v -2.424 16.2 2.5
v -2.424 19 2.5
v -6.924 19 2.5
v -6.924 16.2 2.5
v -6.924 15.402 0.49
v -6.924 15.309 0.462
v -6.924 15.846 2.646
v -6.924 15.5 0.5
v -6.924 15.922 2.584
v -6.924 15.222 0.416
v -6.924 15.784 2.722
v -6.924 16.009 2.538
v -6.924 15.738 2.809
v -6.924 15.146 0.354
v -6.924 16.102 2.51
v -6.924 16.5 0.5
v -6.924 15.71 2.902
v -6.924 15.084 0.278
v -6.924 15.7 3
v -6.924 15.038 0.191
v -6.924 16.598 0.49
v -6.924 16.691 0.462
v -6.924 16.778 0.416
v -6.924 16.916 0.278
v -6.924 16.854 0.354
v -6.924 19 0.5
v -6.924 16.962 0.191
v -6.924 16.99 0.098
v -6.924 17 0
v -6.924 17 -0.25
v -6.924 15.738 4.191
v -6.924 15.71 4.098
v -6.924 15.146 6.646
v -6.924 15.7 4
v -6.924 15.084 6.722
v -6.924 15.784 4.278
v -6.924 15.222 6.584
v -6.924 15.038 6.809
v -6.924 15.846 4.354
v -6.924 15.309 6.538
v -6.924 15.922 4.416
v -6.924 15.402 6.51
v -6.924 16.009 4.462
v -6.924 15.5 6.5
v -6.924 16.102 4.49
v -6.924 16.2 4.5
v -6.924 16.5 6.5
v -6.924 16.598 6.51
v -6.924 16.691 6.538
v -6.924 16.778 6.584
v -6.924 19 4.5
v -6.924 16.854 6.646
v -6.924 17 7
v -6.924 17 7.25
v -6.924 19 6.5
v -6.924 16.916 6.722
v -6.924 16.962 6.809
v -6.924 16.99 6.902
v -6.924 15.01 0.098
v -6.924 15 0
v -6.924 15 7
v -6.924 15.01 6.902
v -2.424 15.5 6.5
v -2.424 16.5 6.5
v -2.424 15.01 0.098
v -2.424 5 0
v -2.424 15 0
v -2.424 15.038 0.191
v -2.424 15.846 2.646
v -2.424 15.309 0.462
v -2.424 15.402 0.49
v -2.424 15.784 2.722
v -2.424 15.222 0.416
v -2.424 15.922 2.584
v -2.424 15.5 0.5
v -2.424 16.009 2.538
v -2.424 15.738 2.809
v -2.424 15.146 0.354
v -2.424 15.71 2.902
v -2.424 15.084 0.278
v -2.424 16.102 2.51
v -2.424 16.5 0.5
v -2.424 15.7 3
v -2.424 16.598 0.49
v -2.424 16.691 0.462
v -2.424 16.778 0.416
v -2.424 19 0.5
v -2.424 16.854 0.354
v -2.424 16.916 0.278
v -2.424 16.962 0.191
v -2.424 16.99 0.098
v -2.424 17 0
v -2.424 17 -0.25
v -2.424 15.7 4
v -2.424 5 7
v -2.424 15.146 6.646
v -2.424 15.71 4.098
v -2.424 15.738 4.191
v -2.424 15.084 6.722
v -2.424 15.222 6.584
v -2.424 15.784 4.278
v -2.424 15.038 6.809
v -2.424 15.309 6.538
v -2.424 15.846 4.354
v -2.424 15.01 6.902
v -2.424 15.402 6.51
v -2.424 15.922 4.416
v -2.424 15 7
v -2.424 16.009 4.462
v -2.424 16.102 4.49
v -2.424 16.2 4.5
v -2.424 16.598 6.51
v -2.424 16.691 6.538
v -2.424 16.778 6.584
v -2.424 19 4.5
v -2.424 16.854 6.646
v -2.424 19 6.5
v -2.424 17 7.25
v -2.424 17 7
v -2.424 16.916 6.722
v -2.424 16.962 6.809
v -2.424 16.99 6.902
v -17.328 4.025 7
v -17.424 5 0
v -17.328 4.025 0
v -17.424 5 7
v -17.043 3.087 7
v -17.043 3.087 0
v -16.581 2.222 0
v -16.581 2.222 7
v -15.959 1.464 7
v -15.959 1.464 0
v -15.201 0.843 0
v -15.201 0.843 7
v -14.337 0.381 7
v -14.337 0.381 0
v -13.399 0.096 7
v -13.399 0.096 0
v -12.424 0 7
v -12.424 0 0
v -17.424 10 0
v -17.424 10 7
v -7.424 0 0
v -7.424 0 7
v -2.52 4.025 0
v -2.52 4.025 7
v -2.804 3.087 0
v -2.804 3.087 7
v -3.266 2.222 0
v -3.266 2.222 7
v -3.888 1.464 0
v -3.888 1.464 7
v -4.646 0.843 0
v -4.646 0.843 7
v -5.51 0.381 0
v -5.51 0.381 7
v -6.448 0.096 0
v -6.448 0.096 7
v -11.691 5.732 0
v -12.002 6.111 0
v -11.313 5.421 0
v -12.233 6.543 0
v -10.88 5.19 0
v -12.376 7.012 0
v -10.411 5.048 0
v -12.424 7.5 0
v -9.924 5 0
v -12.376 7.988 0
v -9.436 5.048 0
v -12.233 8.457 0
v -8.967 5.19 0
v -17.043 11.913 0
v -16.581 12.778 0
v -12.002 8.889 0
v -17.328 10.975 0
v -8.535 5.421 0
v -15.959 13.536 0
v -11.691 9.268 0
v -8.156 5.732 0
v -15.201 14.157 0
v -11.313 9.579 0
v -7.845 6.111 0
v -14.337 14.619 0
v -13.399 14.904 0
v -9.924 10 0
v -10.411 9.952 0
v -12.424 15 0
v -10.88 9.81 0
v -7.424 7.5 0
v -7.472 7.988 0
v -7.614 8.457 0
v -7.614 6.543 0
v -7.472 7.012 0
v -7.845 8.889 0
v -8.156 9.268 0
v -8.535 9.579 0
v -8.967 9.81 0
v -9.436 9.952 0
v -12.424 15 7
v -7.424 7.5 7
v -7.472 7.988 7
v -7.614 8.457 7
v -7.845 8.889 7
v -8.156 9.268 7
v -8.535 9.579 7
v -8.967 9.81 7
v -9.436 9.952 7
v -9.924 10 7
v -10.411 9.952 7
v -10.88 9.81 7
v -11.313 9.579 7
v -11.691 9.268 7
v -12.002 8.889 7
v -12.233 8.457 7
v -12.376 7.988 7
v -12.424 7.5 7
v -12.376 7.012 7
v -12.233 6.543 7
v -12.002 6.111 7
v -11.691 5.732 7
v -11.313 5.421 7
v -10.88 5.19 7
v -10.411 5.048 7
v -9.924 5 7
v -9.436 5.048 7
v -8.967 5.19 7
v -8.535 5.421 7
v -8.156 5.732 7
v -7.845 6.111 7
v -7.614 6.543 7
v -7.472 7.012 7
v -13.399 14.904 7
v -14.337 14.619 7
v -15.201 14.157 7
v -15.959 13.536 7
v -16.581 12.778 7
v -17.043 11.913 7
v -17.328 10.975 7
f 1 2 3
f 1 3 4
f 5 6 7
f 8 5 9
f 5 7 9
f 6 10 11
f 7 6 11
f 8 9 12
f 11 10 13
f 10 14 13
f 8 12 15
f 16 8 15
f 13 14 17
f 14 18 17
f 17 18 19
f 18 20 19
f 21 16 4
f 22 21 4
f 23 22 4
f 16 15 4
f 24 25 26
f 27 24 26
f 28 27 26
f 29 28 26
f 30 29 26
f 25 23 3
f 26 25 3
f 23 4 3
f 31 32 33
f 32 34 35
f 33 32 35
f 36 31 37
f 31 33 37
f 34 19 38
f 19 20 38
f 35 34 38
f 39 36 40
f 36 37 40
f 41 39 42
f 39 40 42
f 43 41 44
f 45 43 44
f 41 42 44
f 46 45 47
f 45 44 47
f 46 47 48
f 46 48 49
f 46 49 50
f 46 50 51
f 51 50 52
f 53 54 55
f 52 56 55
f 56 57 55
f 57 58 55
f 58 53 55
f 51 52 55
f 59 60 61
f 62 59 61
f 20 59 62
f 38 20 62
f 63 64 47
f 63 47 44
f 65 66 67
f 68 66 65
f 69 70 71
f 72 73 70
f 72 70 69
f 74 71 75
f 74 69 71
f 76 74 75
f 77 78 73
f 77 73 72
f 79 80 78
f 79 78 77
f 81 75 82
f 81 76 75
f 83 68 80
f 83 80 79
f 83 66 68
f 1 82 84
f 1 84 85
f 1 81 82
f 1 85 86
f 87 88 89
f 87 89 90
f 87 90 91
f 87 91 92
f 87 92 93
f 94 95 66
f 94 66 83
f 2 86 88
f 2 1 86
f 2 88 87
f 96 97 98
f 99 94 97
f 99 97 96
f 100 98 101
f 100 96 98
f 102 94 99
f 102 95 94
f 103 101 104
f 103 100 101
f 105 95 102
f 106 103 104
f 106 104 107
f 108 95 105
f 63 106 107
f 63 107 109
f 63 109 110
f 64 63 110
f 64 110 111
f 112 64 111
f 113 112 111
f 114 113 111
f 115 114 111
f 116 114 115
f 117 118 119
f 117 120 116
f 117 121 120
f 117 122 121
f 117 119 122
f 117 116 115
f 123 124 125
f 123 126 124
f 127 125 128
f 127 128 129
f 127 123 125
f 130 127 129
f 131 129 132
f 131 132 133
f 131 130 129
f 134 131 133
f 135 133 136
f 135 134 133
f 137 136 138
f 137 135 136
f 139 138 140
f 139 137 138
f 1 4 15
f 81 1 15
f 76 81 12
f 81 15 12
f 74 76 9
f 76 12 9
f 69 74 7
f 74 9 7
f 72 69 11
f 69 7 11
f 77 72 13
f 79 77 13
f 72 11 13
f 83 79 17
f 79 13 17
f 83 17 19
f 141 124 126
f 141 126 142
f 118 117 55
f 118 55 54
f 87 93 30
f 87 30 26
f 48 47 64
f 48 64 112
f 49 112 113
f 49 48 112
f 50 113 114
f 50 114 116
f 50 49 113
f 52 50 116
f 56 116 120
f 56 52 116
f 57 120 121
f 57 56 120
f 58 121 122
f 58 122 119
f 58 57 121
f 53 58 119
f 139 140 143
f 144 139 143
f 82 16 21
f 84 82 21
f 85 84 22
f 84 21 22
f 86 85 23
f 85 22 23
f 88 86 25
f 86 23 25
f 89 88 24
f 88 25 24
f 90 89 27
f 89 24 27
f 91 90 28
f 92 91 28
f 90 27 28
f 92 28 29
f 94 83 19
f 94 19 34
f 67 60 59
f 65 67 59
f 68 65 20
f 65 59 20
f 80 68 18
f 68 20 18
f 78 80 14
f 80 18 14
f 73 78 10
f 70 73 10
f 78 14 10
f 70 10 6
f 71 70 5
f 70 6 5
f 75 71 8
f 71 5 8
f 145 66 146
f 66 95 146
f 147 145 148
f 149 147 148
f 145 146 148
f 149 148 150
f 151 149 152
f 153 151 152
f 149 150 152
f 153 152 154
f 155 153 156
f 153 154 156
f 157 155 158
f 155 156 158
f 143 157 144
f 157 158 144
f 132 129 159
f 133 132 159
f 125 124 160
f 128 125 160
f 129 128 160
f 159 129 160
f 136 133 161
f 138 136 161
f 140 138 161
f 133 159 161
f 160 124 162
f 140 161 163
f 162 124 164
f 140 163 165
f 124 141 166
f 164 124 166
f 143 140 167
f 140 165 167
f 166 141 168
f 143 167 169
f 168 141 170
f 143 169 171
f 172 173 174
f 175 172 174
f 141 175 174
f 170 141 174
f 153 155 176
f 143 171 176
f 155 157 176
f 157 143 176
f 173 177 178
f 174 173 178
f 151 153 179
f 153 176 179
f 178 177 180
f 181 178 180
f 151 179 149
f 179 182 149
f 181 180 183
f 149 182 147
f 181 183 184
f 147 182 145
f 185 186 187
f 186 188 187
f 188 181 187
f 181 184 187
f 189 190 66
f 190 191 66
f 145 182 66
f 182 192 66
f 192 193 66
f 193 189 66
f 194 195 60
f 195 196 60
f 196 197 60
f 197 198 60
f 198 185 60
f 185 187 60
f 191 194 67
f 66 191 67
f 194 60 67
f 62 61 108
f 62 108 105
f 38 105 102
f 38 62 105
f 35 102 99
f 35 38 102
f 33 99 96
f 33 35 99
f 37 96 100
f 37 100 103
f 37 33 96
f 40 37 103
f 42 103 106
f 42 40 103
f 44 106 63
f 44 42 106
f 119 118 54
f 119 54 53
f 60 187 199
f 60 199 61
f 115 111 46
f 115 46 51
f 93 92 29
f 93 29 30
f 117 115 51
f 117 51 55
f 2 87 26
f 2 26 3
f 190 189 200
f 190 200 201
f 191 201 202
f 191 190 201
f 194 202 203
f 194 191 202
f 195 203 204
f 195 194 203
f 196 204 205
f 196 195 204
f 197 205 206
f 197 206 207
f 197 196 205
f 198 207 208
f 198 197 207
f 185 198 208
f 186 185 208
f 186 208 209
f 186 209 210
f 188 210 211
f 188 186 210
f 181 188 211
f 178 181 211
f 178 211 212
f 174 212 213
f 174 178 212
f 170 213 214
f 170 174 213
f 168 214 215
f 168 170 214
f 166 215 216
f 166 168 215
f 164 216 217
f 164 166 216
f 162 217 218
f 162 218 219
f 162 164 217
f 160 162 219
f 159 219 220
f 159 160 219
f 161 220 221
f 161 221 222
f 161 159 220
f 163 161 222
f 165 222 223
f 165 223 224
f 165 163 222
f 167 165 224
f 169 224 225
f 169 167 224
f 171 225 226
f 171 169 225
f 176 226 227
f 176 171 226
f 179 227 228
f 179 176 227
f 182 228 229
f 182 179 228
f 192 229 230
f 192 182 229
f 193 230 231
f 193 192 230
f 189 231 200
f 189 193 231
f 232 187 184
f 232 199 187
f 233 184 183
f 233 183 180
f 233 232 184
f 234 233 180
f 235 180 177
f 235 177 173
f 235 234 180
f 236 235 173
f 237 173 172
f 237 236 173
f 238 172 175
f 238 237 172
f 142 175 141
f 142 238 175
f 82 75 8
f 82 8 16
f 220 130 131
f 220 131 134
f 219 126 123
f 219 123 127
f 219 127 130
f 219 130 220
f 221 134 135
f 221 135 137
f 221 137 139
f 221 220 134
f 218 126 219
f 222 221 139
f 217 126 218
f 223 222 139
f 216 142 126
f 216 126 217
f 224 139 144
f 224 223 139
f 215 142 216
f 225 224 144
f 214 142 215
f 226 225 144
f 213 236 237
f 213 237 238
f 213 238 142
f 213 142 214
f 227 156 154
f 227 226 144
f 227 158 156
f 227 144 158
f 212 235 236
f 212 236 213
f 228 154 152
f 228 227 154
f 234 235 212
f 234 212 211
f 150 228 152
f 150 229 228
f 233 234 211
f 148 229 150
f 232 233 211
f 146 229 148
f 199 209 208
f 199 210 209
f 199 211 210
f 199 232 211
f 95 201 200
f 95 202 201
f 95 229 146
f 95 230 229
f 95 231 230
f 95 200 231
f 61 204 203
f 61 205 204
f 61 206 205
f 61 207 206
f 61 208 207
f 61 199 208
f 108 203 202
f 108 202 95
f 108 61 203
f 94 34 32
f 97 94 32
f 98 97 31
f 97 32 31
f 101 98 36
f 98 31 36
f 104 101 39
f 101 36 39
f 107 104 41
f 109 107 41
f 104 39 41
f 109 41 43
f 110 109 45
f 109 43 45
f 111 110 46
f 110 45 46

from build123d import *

# Parameters (mm, degrees)
F0_W        = 15
F0_H        = 15
F0_R        = 2.5
F1_DEPTH    = 7
F2_W        = 0.7
F2_H        = 2
F3_DEPTH    = 4.5
F4_T1_DEPTH = 4.5
F5_R        = 5


# Not quite as in the source:
# - a fillet or chamfer that OpenCascade refuses, or shapes differently, is made with other operations: its cross-section is extruded or revolved along the edge and cut away or added


with BuildPart() as f1:
    # F0 (on Top) → F1 (new body)
    with BuildSketch(Plane.XY):
        with Locations((-9.923633188, 7.5)):
            Rectangle(F0_W, F0_H)
        with Locations((-9.923633188, 7.5)):
            Circle(F0_R, mode=Mode.SUBTRACT)
    extrude(amount=F1_DEPTH)

    # F2 (on face) → F3 (join)
    with BuildSketch(Plane.YZ.offset(-2.423633188)):
        Polygon((17, 7.25), (17, 6.5), (19, 6.5), align=None)
        Polygon((17, 6.5), (15, 6.5), (15, 4.5), (15.7, 4.5), (19, 4.5), (19, 6.5), align=None)
        with Locations((15.35, 3.5)):
            Rectangle(F2_W, F2_H)
        Polygon((15.7, 2.5), (15, 2.5), (15, 0.5), (17, 0.5), (19, 0.5), (19, 2.5), align=None)
        Polygon((19, 0.5), (17, 0.5), (17, -0.25), align=None)
    extrude(amount=-F3_DEPTH)

    # F4: fillet of radius 0.5 on 7 edges, made by hand

    # F4_s2 → F4_t1 (join)
    with BuildSketch(Plane.YZ.offset(-6.923633188)):
        with BuildLine():
            ThreePointArc((16.2, 2.5), (15.8464466094, 2.6464466094), (15.7, 3))
            Line((15.7, 3), (15.7, 2.5))
            Line((15.7, 2.5), (16.2, 2.5))
        make_face()
        with BuildLine():
            ThreePointArc((15.7, 4), (15.8464466094, 4.3535533906), (16.2, 4.5))
            Line((16.2, 4.5), (15.7, 4.5))
            Line((15.7, 4.5), (15.7, 4))
        make_face()
        with BuildLine():
            ThreePointArc((16.5, 0.5), (16.8535533906, 0.3535533906), (17, 0))
            Line((17, 0), (17, 0.5))
            Line((17, 0.5), (16.5, 0.5))
        make_face()
        with BuildLine():
            ThreePointArc((16.5, 6.5), (16.8535533906, 6.6464466094), (17, 7))
            Line((17, 7), (17, 6.5))
            Line((17, 6.5), (16.5, 6.5))
        make_face()
        with BuildLine():
            ThreePointArc((15, 7), (15.1464466094, 6.6464466094), (15.5, 6.5))
            Line((15.5, 6.5), (15, 6.5))
            Line((15, 6.5), (15, 7))
        make_face()
        with BuildLine():
            ThreePointArc((15, 0), (15.1464466094, 0.3535533906), (15.5, 0.5))
            Line((15.5, 0.5), (15, 0.5))
            Line((15, 0.5), (15, 0))
        make_face()
    extrude(amount=F4_T1_DEPTH)

    # F5
    f5_edges = [f1.edges().sort_by_distance(p)[0] for p in [
        (-17.423633, 15, 3.5),
        (-17.423633, 0, 3.5),
        (-2.423633, 0, 3.5),
    ]]
    fillet(f5_edges, radius=F5_R)


solid = f1.part
